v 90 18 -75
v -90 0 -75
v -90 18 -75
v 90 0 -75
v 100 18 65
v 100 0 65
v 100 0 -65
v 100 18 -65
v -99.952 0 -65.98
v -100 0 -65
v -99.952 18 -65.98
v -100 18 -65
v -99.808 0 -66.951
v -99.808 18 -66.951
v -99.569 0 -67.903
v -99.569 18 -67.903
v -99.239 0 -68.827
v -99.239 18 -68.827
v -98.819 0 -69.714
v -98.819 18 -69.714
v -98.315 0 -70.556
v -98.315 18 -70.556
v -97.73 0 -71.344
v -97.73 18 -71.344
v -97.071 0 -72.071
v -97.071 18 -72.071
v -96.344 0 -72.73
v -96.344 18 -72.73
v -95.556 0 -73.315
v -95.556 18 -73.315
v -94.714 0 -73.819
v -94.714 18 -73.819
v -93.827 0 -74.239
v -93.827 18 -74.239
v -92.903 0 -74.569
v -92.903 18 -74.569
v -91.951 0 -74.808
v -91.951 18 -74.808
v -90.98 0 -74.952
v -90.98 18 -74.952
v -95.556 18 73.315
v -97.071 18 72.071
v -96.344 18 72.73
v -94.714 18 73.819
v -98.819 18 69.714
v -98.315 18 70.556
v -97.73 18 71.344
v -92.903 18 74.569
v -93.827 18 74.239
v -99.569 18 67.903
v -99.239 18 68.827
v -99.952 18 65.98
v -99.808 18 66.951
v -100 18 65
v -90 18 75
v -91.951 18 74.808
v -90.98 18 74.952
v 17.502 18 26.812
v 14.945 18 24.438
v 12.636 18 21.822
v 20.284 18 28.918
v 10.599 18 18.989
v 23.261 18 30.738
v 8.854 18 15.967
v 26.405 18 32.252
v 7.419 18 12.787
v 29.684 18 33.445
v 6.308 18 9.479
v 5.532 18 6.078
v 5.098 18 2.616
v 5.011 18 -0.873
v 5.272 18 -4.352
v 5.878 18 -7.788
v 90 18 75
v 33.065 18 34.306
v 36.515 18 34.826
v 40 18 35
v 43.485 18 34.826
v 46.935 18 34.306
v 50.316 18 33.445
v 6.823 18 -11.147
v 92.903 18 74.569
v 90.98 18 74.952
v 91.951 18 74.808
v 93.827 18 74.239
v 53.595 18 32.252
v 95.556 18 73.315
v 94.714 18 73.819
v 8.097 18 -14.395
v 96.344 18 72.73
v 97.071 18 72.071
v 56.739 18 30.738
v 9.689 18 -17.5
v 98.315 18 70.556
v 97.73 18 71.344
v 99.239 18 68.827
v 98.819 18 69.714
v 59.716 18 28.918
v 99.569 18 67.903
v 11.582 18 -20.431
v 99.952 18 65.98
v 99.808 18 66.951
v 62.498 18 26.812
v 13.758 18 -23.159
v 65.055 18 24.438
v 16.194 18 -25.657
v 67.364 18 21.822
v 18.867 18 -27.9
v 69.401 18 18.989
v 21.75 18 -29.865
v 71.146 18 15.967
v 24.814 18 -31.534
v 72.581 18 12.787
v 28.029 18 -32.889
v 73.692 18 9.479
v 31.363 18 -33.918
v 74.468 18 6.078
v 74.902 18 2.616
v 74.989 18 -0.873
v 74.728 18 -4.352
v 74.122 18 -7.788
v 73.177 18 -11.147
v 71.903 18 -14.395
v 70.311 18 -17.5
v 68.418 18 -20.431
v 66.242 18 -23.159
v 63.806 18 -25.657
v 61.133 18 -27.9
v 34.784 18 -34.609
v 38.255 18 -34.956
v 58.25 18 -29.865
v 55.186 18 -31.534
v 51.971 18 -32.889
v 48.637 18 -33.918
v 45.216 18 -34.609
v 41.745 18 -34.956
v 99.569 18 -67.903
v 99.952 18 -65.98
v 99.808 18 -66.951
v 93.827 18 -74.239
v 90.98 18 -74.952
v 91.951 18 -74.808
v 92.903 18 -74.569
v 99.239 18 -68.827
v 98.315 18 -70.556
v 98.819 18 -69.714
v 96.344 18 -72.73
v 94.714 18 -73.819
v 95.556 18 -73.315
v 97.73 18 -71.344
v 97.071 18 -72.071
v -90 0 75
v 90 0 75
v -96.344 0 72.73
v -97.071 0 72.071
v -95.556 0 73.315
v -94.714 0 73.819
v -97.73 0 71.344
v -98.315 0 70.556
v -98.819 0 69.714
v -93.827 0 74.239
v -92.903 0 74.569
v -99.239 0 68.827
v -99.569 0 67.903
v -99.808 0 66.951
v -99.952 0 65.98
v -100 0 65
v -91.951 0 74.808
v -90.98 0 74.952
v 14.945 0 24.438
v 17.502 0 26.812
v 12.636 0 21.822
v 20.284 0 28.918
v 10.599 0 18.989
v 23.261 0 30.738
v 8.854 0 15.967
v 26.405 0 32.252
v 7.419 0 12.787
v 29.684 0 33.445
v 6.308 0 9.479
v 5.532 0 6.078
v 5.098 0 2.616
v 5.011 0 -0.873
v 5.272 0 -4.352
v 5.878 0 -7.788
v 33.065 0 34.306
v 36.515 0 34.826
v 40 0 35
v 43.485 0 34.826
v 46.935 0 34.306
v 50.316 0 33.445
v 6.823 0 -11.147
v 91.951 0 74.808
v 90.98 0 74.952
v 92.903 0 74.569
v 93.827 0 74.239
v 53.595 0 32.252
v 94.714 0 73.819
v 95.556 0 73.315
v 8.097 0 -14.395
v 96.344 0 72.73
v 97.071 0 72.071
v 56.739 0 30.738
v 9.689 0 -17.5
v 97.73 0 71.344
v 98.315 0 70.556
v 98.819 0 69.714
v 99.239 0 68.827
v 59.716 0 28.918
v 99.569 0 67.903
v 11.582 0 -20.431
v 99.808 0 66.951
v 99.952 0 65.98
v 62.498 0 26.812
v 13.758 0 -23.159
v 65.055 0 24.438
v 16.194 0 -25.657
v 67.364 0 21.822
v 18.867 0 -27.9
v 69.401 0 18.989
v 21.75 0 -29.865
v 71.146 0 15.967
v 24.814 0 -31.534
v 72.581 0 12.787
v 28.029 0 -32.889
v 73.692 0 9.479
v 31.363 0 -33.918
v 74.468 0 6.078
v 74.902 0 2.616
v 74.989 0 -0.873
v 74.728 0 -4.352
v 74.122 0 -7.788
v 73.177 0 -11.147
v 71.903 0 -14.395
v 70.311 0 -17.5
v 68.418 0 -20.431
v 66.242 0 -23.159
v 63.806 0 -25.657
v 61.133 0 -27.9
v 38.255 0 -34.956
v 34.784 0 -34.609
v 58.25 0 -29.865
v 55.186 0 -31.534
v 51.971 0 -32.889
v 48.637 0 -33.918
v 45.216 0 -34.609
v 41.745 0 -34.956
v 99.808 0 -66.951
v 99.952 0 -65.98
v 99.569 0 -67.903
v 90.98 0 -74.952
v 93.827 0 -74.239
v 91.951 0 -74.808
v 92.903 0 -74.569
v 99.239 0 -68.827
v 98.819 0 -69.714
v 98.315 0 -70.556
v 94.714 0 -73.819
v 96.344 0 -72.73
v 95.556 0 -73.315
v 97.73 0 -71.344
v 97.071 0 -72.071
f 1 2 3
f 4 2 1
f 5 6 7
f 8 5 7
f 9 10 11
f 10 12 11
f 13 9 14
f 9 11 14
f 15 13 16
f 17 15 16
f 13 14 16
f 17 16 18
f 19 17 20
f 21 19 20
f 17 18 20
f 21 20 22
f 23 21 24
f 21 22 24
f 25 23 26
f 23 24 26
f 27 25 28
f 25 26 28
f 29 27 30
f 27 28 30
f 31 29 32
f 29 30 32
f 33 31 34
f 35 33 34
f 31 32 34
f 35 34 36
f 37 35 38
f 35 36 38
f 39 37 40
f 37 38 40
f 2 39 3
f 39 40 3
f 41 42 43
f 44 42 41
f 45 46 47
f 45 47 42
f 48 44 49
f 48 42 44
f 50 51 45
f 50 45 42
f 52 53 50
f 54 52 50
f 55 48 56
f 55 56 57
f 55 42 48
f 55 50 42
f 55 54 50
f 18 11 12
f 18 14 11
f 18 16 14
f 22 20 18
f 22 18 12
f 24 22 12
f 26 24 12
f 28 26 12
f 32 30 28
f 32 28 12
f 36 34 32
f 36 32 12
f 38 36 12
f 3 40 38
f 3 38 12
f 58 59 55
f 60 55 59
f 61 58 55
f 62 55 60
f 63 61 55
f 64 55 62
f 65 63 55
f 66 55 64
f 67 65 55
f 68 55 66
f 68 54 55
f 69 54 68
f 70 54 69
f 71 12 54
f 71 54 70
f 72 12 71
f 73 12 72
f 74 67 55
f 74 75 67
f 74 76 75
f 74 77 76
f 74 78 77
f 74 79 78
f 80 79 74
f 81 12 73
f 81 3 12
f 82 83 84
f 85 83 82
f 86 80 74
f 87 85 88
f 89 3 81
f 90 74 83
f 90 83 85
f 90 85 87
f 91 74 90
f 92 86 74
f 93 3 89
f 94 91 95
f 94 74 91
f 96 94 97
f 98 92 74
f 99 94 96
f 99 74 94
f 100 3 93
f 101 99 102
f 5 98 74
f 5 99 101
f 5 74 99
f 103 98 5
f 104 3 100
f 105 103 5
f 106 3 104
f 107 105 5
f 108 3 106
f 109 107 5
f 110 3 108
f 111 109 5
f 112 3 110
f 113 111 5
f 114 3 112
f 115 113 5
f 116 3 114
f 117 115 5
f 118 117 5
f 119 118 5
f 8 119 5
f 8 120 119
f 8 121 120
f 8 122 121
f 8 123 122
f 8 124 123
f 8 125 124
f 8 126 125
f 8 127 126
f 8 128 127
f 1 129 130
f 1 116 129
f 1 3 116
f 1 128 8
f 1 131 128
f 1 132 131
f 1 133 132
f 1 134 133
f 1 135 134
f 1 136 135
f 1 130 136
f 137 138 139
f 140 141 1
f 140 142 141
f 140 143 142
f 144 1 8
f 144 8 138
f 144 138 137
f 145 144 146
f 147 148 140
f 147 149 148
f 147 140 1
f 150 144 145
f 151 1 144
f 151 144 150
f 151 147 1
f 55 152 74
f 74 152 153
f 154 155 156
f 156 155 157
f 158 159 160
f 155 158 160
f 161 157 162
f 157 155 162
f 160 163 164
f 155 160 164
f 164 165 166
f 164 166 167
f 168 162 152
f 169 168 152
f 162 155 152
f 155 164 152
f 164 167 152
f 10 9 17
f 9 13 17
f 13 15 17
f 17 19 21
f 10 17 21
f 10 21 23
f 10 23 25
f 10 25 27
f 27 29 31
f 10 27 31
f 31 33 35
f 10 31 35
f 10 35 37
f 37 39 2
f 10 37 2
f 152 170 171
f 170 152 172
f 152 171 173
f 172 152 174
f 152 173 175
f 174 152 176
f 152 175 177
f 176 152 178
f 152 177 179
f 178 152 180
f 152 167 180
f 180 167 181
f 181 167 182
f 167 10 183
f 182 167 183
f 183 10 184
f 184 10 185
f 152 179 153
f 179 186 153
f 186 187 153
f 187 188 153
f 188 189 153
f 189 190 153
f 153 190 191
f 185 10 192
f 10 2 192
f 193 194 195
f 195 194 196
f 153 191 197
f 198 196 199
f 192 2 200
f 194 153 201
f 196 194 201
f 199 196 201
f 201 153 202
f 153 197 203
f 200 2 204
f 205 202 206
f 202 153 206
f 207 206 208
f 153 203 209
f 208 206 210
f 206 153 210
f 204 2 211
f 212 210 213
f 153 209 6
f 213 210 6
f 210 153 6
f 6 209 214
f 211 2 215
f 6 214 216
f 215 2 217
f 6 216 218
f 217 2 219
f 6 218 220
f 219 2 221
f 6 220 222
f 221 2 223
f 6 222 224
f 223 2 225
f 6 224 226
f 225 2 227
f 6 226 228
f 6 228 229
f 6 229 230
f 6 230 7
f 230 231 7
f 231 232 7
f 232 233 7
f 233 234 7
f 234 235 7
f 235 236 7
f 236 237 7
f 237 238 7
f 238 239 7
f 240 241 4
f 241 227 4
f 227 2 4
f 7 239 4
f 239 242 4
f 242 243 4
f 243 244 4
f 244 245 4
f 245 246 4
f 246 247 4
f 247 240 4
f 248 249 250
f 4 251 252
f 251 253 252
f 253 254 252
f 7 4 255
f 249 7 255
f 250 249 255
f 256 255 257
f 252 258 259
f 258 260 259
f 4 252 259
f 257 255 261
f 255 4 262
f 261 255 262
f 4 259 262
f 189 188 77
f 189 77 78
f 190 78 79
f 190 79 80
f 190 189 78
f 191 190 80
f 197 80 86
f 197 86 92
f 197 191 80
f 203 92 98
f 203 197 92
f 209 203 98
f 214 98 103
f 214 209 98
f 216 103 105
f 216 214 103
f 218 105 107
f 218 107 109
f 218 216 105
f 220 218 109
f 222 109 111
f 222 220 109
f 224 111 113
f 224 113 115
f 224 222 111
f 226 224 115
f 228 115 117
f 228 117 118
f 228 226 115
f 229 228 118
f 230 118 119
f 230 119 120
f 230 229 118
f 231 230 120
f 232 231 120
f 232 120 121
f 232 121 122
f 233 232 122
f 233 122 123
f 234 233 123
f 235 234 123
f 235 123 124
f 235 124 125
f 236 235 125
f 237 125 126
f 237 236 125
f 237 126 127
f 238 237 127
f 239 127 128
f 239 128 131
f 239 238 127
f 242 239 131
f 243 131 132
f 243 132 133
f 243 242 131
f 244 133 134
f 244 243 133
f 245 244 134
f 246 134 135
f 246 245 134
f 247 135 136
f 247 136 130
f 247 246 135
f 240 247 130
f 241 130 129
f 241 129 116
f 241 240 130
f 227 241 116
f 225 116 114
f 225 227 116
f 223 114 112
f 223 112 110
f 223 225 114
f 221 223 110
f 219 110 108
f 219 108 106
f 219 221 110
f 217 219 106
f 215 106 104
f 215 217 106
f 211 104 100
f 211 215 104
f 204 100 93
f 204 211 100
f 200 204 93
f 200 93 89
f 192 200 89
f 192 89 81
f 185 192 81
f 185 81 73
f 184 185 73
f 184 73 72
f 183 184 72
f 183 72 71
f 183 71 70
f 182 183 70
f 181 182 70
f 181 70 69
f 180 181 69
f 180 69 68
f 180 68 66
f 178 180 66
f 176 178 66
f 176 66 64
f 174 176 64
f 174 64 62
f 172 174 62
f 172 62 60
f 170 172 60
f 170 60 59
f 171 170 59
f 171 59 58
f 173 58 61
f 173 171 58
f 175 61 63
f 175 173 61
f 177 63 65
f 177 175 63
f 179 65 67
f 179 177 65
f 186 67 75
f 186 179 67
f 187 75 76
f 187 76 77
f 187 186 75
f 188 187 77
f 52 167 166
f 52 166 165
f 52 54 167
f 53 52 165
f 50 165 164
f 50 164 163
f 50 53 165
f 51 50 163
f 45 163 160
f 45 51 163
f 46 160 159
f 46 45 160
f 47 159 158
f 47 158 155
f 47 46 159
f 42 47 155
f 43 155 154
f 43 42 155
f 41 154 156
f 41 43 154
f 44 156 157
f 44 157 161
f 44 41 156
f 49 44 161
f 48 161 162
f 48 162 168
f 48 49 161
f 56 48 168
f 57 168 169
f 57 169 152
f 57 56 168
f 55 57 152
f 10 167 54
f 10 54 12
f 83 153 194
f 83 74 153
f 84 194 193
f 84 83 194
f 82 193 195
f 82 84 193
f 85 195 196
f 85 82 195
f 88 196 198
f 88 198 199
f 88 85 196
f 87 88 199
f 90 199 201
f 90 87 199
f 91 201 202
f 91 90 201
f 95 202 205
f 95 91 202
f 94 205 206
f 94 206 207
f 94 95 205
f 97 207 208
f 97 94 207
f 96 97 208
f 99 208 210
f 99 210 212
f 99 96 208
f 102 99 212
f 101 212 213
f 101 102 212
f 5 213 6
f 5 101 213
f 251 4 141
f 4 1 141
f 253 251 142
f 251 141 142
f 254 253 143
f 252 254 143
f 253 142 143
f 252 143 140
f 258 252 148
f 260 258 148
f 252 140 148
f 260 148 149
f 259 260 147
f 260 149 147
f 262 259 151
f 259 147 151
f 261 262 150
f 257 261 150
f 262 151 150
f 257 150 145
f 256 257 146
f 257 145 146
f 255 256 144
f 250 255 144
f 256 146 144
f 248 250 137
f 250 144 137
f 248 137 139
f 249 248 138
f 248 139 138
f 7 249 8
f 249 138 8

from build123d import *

# Parameters (mm, degrees)
SKETCH_1_W      = 200
SKETCH_1_H      = 150
SKETCH_1_R      = 35
EXTRUDE_1_DEPTH = 18
FILLET_1_R      = 10


with BuildPart() as part:
    # 草图1 → 凸台-拉伸1 (new body)
    with BuildSketch(Plane(origin=(0, 0, 0), x_dir=(1, 0, 0), z_dir=(0, 1, 0))):
        Rectangle(SKETCH_1_W, SKETCH_1_H)
        with Locations(Location((40, 0, 0), (0, 0, 270))):
            Circle(SKETCH_1_R, mode=Mode.SUBTRACT)
    extrude(amount=EXTRUDE_1_DEPTH)

    # 圆角1
    fillet_1_edges = [part.edges().sort_by_distance(p)[0] for p in [
        (-100, 9, -75),
        (100, 9, -75),
        (100, 9, 75),
        (-100, 9, 75),
    ]]
    fillet(fillet_1_edges, radius=FILLET_1_R)


solid = part.part
